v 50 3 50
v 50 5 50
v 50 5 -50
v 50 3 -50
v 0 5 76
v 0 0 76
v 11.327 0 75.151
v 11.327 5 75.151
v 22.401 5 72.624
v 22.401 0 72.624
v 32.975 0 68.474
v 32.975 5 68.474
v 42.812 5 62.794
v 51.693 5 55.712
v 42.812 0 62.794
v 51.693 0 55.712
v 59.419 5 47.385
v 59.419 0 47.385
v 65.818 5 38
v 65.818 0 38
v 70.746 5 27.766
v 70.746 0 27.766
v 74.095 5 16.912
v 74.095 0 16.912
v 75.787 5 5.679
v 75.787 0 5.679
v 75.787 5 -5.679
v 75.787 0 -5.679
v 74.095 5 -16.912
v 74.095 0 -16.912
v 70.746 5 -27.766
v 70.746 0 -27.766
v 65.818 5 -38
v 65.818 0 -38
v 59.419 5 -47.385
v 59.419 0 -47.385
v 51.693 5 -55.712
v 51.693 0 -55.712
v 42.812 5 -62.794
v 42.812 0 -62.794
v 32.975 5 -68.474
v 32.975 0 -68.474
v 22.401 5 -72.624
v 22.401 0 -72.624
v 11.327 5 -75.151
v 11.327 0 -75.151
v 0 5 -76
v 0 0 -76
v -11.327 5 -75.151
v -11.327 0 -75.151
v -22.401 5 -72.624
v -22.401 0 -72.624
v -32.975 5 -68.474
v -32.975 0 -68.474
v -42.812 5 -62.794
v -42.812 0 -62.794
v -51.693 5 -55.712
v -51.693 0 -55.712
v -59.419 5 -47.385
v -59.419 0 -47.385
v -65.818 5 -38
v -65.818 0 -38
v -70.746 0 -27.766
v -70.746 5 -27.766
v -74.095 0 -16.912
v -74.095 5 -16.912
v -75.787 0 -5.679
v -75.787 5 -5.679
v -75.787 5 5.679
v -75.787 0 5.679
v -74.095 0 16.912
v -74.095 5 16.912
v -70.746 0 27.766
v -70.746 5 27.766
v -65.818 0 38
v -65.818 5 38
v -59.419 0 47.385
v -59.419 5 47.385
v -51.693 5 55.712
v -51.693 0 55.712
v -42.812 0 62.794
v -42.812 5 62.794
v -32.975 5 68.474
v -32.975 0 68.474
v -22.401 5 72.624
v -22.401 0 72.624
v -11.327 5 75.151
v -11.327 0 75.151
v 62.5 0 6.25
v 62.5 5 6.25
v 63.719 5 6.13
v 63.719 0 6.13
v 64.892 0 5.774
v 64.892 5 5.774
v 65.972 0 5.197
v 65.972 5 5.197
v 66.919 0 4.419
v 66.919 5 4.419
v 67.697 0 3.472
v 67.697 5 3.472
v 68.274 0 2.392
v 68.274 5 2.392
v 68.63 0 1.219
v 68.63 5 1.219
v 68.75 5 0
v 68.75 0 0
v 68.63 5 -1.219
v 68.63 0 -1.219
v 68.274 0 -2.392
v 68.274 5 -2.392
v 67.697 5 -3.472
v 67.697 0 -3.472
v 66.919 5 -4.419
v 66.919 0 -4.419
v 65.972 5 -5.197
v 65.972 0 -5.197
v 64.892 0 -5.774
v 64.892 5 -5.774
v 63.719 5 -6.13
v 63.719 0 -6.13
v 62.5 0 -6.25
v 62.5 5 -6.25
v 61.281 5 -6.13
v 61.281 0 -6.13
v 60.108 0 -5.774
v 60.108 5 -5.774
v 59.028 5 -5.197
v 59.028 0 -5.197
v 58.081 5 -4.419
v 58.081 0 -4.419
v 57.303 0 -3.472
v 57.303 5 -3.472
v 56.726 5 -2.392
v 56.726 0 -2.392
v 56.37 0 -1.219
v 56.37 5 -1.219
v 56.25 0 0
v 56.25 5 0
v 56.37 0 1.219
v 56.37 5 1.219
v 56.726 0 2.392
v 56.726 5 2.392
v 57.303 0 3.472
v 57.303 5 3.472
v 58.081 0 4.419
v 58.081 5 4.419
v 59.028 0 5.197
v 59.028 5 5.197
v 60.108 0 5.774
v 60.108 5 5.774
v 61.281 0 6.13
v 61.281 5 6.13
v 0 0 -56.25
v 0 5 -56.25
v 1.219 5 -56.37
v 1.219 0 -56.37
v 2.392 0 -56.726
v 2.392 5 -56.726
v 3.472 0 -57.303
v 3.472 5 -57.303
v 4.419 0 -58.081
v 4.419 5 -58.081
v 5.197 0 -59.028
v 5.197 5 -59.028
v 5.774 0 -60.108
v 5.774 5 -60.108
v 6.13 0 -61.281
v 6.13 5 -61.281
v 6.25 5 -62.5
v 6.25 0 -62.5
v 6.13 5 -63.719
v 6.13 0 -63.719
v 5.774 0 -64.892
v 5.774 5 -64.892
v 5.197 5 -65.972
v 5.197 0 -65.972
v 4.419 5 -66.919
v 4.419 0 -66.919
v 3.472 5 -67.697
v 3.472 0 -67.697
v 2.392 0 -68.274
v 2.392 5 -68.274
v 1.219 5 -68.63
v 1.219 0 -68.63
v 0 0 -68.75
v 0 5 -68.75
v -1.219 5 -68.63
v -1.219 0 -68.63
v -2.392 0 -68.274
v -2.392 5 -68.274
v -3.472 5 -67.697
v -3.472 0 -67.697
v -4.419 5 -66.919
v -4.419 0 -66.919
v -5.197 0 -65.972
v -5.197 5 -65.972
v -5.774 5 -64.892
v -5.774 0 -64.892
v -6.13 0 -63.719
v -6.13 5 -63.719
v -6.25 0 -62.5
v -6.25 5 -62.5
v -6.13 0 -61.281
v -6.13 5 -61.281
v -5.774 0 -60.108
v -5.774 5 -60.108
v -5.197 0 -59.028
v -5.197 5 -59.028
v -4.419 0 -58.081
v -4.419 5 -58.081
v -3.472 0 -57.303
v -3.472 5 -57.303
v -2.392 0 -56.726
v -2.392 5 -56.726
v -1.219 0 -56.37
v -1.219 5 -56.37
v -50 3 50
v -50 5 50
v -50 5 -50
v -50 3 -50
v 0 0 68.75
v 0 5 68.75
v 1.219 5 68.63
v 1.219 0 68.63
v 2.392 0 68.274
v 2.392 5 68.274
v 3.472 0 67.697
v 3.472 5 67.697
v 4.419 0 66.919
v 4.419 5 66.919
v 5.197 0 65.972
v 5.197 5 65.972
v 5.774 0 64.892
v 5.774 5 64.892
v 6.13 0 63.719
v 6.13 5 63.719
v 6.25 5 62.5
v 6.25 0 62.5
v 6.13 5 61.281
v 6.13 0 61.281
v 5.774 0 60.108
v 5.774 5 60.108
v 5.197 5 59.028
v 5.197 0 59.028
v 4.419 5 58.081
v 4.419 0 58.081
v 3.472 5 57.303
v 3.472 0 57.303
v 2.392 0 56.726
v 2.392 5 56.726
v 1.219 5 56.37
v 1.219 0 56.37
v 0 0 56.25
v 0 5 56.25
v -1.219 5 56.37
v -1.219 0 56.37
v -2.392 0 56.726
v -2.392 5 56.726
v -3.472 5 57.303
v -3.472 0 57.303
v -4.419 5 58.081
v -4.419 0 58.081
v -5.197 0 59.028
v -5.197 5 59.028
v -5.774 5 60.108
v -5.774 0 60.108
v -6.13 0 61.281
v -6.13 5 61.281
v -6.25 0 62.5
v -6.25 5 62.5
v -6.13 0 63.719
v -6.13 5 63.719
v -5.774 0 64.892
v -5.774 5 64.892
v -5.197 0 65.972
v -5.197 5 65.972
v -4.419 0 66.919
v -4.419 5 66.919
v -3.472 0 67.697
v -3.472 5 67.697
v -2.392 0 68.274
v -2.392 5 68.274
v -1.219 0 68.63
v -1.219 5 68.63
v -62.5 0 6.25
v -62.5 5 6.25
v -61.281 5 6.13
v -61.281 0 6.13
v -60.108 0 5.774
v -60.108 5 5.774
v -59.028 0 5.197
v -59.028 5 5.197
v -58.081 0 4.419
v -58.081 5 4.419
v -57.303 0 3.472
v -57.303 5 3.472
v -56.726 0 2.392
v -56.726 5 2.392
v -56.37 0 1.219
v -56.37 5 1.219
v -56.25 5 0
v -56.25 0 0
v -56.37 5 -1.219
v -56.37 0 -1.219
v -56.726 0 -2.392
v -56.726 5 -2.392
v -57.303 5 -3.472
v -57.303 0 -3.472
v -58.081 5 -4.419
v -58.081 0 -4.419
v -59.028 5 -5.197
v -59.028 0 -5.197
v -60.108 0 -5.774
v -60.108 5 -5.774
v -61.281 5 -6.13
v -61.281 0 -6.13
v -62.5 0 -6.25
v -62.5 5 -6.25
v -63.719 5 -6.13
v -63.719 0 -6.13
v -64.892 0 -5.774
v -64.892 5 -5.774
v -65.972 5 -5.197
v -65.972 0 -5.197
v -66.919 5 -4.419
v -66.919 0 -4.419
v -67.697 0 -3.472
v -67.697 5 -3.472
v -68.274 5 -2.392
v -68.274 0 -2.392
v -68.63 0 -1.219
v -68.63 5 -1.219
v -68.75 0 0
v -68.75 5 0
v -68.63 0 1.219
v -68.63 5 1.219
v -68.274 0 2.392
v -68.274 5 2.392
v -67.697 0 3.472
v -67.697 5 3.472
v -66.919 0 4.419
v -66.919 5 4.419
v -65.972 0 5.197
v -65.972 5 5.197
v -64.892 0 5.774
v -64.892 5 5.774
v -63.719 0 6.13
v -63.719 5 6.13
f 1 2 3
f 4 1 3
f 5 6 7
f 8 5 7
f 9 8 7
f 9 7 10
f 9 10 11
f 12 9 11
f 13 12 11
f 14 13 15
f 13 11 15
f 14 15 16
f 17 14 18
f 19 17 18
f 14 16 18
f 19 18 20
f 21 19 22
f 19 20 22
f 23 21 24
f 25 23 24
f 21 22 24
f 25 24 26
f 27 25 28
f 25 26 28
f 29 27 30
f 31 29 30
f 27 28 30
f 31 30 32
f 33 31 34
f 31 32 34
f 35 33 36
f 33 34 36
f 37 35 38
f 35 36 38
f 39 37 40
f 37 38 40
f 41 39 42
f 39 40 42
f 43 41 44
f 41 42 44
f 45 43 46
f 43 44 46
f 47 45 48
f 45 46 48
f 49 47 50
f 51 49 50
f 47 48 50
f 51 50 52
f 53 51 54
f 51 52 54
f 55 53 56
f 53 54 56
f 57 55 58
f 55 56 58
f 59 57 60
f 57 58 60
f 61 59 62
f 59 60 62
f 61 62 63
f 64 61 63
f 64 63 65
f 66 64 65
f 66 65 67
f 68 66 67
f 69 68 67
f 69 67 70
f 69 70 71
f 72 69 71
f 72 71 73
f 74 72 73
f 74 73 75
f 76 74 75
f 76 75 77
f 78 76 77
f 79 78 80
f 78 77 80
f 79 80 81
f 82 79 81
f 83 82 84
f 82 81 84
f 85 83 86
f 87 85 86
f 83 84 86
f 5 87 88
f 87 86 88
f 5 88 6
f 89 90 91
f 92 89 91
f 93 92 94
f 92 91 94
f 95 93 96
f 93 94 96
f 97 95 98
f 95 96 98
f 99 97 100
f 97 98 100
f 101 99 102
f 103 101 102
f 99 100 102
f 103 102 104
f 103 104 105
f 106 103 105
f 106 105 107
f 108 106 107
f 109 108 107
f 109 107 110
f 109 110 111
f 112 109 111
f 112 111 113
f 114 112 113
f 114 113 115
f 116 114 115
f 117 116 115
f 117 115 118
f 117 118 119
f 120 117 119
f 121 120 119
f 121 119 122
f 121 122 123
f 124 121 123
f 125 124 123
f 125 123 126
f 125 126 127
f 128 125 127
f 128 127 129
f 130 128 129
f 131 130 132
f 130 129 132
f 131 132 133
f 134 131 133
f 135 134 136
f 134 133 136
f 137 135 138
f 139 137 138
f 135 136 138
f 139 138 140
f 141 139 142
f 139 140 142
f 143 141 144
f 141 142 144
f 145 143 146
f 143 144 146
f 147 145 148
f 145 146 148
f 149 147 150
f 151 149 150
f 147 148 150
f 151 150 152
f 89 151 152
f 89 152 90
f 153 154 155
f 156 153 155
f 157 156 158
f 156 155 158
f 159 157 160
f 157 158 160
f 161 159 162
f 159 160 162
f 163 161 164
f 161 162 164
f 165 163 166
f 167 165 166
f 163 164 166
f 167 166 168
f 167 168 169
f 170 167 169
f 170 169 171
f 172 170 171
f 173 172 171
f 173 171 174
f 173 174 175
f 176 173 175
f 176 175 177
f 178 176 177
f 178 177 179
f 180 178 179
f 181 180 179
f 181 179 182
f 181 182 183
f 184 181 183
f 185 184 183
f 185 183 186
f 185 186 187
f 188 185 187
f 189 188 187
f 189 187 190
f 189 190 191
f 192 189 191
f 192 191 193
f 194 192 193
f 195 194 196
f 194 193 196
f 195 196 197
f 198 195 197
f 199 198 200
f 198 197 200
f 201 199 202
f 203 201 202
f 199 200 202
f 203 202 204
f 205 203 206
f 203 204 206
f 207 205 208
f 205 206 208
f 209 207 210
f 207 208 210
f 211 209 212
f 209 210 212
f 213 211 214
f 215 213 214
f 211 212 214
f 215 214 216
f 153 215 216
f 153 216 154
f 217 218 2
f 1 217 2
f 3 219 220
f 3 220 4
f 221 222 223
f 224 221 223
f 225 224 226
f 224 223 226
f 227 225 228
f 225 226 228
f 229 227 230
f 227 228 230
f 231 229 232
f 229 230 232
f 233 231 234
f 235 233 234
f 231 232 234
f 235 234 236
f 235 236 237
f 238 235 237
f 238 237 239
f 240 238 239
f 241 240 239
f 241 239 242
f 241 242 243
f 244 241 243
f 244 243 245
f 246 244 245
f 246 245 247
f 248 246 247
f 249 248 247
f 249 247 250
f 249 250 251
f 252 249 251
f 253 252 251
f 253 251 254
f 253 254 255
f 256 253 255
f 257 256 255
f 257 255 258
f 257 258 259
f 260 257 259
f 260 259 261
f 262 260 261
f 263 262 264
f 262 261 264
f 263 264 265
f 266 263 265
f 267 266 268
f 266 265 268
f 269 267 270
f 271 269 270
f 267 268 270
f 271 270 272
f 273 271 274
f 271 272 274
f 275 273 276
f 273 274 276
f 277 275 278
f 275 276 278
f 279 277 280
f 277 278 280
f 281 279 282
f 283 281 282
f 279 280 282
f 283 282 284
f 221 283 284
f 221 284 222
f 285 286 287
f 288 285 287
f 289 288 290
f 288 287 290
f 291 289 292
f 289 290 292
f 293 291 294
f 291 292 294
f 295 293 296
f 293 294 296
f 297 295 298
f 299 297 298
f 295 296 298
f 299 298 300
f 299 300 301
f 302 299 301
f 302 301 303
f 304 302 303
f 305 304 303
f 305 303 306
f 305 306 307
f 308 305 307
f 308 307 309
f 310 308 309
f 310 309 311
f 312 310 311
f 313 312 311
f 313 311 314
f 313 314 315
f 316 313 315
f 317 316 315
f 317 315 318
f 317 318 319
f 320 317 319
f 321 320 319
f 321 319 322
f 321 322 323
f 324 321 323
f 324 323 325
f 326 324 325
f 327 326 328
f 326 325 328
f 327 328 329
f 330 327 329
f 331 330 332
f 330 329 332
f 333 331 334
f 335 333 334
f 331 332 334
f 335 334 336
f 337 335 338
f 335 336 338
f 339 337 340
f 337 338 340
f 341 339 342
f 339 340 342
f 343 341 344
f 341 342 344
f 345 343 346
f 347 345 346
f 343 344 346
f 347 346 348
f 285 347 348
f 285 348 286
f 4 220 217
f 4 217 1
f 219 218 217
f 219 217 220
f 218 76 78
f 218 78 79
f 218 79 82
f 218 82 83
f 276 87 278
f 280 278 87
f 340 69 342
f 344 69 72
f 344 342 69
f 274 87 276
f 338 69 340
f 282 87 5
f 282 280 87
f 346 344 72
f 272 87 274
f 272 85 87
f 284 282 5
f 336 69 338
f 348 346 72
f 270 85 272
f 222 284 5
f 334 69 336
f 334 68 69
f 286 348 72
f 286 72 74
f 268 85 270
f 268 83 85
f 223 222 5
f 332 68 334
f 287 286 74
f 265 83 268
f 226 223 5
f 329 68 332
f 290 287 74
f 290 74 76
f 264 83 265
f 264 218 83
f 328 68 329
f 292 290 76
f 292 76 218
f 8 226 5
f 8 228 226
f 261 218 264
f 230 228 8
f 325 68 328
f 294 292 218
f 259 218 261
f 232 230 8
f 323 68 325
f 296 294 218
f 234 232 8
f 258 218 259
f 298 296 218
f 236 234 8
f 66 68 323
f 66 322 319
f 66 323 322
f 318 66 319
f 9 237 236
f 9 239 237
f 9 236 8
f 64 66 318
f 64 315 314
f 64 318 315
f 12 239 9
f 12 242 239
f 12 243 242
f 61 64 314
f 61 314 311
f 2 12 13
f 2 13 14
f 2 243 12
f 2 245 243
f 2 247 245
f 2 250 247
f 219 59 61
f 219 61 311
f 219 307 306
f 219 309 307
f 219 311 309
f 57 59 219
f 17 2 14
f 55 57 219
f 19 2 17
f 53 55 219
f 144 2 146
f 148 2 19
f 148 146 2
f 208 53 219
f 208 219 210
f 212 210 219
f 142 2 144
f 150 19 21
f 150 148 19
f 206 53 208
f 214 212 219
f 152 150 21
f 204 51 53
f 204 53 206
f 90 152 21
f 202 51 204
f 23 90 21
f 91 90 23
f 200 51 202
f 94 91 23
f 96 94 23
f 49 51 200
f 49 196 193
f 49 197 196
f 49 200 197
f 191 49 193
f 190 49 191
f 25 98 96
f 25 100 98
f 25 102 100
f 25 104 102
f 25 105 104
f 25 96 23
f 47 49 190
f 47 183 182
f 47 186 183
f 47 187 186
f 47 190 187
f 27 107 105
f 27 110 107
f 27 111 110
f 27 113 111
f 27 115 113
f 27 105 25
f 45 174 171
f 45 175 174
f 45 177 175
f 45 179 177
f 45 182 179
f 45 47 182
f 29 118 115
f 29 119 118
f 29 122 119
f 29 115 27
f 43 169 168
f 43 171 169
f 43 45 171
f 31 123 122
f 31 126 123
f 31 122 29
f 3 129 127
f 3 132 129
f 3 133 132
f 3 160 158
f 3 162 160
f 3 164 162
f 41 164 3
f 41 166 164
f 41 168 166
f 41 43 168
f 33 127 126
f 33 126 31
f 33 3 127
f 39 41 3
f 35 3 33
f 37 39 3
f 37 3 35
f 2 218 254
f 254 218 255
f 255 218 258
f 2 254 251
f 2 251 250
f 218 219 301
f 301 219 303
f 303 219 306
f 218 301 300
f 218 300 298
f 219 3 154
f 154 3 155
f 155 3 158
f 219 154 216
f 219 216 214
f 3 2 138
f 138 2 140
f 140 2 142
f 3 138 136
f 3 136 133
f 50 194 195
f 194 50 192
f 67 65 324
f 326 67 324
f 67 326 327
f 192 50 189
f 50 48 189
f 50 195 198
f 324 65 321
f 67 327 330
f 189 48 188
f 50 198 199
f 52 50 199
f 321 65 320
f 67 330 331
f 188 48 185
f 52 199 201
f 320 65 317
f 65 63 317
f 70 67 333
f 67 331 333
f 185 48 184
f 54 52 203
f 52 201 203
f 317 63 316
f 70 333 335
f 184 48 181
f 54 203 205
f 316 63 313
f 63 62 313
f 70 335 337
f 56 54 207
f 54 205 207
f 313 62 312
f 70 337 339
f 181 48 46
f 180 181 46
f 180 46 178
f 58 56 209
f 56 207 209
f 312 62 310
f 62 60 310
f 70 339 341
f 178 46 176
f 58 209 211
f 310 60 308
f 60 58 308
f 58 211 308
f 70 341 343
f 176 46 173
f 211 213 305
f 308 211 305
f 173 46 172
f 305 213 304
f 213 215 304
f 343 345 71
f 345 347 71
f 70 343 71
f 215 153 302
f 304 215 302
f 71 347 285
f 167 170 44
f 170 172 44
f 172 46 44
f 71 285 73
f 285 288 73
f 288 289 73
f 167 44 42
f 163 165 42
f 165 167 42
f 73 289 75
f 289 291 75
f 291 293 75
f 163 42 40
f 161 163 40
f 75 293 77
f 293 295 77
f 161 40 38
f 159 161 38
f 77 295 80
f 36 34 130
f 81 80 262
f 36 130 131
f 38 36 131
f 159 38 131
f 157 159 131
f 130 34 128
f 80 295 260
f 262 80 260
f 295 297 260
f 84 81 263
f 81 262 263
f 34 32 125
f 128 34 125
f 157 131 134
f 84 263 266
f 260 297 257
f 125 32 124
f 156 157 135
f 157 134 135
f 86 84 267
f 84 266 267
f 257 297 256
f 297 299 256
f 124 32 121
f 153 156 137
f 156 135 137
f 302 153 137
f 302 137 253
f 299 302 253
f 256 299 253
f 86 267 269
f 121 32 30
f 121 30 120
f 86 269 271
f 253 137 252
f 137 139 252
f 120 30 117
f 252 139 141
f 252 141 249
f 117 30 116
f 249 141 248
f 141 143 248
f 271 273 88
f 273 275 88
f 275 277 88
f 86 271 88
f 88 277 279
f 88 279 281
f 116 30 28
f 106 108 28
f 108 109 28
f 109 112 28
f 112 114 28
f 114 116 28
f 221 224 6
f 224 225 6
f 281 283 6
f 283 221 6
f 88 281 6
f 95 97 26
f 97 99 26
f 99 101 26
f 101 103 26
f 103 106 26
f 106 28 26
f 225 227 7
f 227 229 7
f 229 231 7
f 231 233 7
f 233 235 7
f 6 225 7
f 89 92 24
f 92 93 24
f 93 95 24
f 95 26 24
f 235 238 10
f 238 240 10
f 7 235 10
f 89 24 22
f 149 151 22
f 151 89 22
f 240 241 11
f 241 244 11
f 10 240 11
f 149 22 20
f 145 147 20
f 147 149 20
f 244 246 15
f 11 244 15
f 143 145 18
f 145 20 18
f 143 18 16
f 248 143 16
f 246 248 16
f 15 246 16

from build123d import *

# Parameters (mm, degrees)
SKETCH1_R           = 76
SKETCH1_W           = 100
SKETCH1_H           = 100
BOSS_EXTRUDE1_DEPTH = 5
SKETCH3_W           = 100
SKETCH3_H           = 100
BOSS_EXTRUDE2_DEPTH = 5
SKETCH3_2_W         = 100
SKETCH3_2_H         = 100
CUT_EXTRUDE1_DEPTH  = 2
SKETCH6_R           = 6.25
CUT_EXTRUDE2_DEPTH  = 10


with BuildPart() as part:
    # Sketch1 → Boss-Extrude1 (new body)
    with BuildSketch(Plane(origin=(0, 0, 0), x_dir=(1, 0, 0), z_dir=(0, 1, 0))):
        Circle(SKETCH1_R)
        Rectangle(SKETCH1_W, SKETCH1_H, mode=Mode.SUBTRACT)
    extrude(amount=BOSS_EXTRUDE1_DEPTH)

    # Sketch3 → Boss-Extrude2 (add)
    with BuildSketch(Plane(origin=(0, 5, 0), x_dir=(1, 0, 0), z_dir=(0, 1, 0))):
        Rectangle(SKETCH3_W, SKETCH3_H)
    extrude(amount=-BOSS_EXTRUDE2_DEPTH)

    # Sketch3<2> → Cut-Extrude1 (cut)
    with BuildSketch(Plane(origin=(0, 5, 0), x_dir=(1, 0, 0), z_dir=(0, 1, 0))):
        Rectangle(SKETCH3_2_W, SKETCH3_2_H)
    extrude(amount=-CUT_EXTRUDE1_DEPTH, mode=Mode.SUBTRACT)

    # Sketch6 → Cut-Extrude2 (cut)
    with BuildSketch(Plane(origin=(0, 5, 0), x_dir=(1, 0, 0), z_dir=(0, 1, 0))):
        with Locations((0, 62.5)):
            Circle(SKETCH6_R)
        with Locations((62.5, 0)):
            Circle(SKETCH6_R)
        with Locations((0, -62.5)):
            Circle(SKETCH6_R)
        with Locations((-62.5, 0)):
            Circle(SKETCH6_R)
    extrude(amount=-CUT_EXTRUDE2_DEPTH, mode=Mode.SUBTRACT)


solid = part.part
